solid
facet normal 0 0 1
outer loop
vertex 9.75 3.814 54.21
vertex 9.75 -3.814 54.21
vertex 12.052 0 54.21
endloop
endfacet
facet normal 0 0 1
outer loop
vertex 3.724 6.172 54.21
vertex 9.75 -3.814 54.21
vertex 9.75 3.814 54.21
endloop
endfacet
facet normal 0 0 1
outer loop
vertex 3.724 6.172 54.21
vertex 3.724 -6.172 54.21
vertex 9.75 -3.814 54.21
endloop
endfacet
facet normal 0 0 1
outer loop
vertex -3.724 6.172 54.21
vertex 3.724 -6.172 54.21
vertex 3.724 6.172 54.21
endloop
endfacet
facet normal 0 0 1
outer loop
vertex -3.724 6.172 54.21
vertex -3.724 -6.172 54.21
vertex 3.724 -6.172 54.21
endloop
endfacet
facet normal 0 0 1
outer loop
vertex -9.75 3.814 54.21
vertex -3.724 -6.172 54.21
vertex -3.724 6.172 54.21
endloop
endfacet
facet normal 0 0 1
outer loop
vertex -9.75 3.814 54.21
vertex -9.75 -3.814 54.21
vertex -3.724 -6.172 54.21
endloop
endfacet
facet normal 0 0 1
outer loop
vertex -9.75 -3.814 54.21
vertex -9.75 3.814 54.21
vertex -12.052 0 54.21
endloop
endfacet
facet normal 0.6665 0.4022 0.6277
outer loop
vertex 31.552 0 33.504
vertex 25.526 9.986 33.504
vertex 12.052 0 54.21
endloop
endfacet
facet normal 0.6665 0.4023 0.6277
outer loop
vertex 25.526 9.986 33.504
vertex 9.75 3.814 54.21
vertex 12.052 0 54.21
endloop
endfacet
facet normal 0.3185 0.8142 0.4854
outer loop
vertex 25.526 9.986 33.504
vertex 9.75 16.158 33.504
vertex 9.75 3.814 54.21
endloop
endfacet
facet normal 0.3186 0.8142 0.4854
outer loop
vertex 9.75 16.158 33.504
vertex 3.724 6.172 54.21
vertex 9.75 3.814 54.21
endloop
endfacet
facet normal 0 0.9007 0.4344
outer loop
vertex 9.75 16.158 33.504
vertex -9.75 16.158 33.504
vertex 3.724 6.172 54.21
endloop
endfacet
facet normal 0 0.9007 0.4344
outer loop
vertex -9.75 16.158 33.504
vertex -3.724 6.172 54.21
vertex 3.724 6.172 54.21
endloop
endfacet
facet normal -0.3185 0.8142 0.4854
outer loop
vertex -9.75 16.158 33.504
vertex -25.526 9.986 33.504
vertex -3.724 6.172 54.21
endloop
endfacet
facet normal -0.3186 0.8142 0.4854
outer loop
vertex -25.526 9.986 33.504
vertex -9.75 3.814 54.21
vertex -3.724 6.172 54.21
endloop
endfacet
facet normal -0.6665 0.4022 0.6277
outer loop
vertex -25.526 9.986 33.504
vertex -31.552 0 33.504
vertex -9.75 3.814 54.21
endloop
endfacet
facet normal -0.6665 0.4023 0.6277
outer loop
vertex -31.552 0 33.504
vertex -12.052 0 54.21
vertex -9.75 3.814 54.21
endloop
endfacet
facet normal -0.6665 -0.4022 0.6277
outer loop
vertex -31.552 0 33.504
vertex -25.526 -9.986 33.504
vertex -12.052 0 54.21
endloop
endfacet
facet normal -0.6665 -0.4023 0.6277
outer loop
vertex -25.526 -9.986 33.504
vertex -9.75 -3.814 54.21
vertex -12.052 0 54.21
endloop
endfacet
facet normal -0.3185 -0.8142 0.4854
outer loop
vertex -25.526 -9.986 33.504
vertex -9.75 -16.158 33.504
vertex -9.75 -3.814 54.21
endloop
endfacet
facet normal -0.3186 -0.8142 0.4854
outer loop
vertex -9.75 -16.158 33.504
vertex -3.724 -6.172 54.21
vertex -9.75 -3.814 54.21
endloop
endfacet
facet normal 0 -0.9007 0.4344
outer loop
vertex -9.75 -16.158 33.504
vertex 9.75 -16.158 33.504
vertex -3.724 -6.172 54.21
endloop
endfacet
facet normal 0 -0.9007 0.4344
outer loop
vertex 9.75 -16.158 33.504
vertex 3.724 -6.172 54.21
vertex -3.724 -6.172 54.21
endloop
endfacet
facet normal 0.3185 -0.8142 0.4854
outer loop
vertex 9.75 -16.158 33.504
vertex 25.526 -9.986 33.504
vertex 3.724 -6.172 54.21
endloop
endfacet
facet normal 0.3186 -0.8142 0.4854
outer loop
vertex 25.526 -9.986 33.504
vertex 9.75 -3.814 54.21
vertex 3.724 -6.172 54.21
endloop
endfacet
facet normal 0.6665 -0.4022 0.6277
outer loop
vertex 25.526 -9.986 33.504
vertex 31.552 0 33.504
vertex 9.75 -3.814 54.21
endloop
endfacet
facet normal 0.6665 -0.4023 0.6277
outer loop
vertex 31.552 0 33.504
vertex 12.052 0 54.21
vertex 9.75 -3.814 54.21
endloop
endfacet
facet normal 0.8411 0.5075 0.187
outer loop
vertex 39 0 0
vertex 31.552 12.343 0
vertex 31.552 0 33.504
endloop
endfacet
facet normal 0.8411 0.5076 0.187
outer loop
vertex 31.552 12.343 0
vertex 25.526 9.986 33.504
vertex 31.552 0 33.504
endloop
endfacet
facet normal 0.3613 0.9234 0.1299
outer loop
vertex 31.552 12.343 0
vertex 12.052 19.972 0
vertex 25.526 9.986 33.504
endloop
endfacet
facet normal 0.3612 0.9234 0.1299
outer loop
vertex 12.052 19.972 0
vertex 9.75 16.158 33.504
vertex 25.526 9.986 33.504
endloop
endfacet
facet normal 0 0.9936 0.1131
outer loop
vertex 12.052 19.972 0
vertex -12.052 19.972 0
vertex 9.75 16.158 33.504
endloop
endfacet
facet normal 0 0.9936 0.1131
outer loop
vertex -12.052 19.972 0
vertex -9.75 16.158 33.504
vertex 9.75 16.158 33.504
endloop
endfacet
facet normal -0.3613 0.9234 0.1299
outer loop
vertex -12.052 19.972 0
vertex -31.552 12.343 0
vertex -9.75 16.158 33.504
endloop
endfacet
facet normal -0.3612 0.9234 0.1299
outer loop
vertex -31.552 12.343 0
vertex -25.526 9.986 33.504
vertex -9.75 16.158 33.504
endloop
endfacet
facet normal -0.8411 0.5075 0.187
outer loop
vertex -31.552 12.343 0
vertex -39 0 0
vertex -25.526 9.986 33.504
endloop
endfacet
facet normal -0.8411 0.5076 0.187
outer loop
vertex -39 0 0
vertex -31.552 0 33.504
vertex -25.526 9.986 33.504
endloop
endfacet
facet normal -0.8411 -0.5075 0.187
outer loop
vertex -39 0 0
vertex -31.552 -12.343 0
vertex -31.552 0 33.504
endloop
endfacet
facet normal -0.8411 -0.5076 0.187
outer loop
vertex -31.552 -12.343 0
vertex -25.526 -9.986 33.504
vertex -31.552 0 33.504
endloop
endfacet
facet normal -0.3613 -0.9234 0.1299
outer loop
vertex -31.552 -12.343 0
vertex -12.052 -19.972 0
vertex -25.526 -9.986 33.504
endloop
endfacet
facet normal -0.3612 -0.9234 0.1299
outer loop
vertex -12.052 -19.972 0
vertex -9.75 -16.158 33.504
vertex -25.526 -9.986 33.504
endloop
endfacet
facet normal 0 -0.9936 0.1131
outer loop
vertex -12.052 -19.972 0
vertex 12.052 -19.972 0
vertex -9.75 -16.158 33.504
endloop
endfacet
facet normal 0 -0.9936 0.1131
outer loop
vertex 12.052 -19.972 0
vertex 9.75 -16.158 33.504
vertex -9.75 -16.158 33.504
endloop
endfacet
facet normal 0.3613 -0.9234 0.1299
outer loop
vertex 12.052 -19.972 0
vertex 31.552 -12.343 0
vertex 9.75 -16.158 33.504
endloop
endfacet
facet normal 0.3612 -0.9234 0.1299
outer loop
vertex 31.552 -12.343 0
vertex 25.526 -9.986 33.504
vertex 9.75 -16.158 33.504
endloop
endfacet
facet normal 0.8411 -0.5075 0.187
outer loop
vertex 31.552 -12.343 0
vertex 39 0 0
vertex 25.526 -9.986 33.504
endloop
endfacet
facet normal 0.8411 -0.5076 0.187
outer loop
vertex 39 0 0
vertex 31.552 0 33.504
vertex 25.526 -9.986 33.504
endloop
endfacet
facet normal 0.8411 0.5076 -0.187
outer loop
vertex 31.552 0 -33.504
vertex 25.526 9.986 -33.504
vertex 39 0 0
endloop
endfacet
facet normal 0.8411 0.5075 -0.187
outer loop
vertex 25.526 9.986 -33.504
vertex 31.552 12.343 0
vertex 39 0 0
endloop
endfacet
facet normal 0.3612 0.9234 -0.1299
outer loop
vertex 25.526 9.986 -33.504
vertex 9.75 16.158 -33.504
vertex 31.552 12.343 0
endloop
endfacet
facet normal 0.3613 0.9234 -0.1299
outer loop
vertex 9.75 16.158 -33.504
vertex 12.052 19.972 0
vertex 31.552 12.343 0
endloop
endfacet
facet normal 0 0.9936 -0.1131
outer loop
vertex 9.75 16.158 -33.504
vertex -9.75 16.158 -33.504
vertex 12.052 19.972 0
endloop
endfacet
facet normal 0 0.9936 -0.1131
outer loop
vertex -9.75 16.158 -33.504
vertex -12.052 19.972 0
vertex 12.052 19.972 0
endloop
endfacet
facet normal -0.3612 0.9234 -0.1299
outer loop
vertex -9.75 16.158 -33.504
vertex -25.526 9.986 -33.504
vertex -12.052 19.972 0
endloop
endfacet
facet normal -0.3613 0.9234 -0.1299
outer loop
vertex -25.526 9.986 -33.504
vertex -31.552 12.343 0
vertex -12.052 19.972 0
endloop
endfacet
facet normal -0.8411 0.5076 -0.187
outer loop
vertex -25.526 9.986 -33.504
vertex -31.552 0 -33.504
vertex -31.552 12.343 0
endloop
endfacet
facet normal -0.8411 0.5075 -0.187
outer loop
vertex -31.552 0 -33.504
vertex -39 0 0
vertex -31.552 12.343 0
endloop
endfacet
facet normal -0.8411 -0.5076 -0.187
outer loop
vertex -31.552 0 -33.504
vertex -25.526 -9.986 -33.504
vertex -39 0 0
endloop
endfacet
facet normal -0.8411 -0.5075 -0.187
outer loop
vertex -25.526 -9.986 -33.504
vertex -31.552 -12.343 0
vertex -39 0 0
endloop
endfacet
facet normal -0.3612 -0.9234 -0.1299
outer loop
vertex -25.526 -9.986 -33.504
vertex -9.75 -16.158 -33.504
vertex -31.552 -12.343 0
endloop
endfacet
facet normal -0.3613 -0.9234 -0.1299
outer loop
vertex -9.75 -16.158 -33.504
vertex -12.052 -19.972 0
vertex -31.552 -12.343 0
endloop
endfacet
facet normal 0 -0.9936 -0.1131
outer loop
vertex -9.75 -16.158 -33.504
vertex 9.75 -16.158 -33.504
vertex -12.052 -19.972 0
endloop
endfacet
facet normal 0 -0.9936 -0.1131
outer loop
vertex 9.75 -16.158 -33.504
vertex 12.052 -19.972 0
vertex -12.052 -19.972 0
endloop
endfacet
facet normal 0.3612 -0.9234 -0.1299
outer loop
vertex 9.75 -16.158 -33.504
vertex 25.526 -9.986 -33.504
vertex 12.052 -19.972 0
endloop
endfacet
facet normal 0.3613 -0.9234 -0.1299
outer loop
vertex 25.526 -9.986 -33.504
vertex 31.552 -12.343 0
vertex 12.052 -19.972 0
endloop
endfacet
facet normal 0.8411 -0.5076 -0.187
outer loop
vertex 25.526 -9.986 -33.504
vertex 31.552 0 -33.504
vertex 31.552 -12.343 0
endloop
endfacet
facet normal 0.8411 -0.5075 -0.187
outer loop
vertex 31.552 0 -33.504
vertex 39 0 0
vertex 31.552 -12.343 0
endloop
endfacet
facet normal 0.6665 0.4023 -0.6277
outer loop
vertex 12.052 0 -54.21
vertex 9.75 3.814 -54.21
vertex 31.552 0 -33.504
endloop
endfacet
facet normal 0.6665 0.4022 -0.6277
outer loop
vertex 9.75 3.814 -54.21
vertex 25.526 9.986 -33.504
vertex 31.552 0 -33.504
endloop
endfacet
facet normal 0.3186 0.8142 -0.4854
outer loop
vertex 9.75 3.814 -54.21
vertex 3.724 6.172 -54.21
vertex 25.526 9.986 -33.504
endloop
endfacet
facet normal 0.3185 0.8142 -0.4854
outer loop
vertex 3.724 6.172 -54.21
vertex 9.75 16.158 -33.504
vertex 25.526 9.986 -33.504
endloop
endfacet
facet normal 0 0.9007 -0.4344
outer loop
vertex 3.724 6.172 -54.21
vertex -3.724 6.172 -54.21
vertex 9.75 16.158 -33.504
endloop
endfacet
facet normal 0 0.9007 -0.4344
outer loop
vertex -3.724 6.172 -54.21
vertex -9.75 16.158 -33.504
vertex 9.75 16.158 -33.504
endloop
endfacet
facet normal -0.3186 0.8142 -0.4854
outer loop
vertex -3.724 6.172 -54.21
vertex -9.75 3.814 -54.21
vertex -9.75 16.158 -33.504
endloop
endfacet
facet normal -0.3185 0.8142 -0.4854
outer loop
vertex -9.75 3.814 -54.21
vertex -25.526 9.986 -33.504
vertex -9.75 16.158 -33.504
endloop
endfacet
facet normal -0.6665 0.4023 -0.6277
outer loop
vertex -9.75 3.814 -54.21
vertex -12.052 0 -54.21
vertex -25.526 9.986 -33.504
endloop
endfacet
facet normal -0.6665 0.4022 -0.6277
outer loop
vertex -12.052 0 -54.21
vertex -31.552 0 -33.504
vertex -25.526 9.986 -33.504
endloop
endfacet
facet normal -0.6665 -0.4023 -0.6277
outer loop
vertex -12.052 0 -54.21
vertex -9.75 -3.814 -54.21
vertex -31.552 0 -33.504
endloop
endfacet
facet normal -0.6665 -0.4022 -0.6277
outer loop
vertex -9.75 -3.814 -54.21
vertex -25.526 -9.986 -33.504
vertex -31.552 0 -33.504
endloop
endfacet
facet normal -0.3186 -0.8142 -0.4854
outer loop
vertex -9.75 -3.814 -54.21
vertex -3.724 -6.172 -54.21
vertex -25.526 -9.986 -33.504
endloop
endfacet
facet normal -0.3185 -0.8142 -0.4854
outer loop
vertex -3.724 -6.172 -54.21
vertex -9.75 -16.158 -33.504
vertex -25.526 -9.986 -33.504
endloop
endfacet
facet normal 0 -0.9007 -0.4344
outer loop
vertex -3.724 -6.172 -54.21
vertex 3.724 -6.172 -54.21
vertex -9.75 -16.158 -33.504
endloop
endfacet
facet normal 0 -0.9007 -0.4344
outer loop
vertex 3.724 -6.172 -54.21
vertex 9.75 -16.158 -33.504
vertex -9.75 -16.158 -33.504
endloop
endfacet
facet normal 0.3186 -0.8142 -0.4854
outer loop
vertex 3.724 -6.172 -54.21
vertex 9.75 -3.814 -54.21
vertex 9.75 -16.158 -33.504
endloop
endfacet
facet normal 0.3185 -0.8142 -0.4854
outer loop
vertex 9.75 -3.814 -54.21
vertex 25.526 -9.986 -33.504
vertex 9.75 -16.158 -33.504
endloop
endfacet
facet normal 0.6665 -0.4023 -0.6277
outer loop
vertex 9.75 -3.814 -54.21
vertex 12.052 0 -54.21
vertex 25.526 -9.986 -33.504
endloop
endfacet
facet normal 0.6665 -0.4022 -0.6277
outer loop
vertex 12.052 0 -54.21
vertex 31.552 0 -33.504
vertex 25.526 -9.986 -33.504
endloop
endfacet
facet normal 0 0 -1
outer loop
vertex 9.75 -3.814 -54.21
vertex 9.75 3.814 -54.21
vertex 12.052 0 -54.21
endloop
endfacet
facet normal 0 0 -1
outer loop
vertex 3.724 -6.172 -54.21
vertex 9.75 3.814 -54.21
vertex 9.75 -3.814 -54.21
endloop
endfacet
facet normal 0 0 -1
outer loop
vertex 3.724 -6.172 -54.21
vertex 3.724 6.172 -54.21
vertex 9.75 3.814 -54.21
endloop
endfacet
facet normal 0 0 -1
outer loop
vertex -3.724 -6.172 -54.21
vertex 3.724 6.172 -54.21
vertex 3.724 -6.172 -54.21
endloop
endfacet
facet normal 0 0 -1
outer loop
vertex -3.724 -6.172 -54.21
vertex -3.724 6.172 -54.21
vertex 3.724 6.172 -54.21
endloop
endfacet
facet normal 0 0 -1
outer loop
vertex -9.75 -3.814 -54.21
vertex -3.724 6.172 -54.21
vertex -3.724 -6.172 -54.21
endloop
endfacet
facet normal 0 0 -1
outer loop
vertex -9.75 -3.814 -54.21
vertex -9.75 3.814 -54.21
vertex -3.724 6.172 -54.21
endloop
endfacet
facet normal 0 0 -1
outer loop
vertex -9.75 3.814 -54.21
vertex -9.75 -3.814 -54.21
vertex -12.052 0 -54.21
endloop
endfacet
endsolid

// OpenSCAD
// Generated by SolidPython 1.0.1 on 2020-07-29 00:46:50


scale(v = [13, 7, 19]) {
	sphere(r = 3);
}
/***********************************************
*********      SolidPython code:      **********
************************************************
 
# import packages: SolidPython
from solid import *
from solid.utils import *
from itertools import chain, combinations, permutations


class Resize:

    def __init__(self, scad_file):
        self.scad_file = scad_file
        #self.scad_file = import_scad(scad_file)
        # cone/cylinder param:
        self.r1 = 0
        self.r2 = 0
        self.h = 0
        # rectangular prism param:
        self.w = 0
        self.l = 0
        # ellipse param:
        self.r = 0

    # import OpenScad code (file name corresponds to shape)


    # classify shape + parameters
    def assign(self, param1, param2, param3):
        if self.scad_file == 'cone.scad':
            self.r1 = param1
            self.r2 = param2
            self.h = param3
        elif self.scad_file == 'cylinder.scad':
            self.r1 = param1
            self.r2 = param2
            self.h = param3
        elif self.scad_file == 'rectangularPrism.scad':
            self.h = param1
            self.l = param2
            self.w = param3
        else:
            self.r = param1
            self.h = param2

    # resize parameters
    def iterate(self):
        x = range(3, 20, 2)
        i = 1
        if self.scad_file == 'cone.scad':
            tempList = list(permutations(x, 2))
            for temp in tempList:
                param1 = temp[0]
                param2 = temp[1]
                filepath = 'produced_scad_files/' + 'cone' + str(param1) + '_' + str(param2) + '_' + '.scad'
                scad_render_to_file(cylinder(h=param1, r1=param2, r2=0), filepath)

        elif self.scad_file == 'cylinder.scad':
            tempList = list(permutations(x, 3))
            for temp in tempList:
                param1 = temp[0]
                param2 = temp[1]
                filepath = 'produced_scad_files/' + 'cylinder' + str(param1) + '_' + str(param2) + '_' + '.scad'
                scad_render_to_file(cylinder(h=param1, r1=param2, r2=param2), filepath)

        elif self.scad_file == 'rectangularPrism.scad':
            tempList = list(permutations(x, 3))
            for temp in tempList:
                param1 = temp[0]
                param2 = temp[1]
                param3 = temp[2]
                filepath = 'produced_scad_files/' + 'rectangularPrism' + str(param1) + '_' + str(param2) + '_' + str(
                    param3) + '.scad'
                scad_render_to_file(cube(size=(param1, param2, param3)), filepath)

        elif self.scad_file == 'ellipse.scad':
            tempList = list(permutations(x, 4))
            for temp in tempList:
                param1 = temp[0]
                param2 = temp[1]
                param3 = temp[2]
                param4 = temp[3]
                filepath = 'produced_scad_files/' + 'ellipse' + str(param1) + '_' + str(param2) + '_' + str(param3) + '_' + str(param4) + '.scad'
                scad_render_to_file(scale([param1, param2, param3])(sphere(r=param4)), filepath)

    def render_to_scadfile(self):
        scad_render_to_file(scad, 'example.scad') 
 
************************************************/
